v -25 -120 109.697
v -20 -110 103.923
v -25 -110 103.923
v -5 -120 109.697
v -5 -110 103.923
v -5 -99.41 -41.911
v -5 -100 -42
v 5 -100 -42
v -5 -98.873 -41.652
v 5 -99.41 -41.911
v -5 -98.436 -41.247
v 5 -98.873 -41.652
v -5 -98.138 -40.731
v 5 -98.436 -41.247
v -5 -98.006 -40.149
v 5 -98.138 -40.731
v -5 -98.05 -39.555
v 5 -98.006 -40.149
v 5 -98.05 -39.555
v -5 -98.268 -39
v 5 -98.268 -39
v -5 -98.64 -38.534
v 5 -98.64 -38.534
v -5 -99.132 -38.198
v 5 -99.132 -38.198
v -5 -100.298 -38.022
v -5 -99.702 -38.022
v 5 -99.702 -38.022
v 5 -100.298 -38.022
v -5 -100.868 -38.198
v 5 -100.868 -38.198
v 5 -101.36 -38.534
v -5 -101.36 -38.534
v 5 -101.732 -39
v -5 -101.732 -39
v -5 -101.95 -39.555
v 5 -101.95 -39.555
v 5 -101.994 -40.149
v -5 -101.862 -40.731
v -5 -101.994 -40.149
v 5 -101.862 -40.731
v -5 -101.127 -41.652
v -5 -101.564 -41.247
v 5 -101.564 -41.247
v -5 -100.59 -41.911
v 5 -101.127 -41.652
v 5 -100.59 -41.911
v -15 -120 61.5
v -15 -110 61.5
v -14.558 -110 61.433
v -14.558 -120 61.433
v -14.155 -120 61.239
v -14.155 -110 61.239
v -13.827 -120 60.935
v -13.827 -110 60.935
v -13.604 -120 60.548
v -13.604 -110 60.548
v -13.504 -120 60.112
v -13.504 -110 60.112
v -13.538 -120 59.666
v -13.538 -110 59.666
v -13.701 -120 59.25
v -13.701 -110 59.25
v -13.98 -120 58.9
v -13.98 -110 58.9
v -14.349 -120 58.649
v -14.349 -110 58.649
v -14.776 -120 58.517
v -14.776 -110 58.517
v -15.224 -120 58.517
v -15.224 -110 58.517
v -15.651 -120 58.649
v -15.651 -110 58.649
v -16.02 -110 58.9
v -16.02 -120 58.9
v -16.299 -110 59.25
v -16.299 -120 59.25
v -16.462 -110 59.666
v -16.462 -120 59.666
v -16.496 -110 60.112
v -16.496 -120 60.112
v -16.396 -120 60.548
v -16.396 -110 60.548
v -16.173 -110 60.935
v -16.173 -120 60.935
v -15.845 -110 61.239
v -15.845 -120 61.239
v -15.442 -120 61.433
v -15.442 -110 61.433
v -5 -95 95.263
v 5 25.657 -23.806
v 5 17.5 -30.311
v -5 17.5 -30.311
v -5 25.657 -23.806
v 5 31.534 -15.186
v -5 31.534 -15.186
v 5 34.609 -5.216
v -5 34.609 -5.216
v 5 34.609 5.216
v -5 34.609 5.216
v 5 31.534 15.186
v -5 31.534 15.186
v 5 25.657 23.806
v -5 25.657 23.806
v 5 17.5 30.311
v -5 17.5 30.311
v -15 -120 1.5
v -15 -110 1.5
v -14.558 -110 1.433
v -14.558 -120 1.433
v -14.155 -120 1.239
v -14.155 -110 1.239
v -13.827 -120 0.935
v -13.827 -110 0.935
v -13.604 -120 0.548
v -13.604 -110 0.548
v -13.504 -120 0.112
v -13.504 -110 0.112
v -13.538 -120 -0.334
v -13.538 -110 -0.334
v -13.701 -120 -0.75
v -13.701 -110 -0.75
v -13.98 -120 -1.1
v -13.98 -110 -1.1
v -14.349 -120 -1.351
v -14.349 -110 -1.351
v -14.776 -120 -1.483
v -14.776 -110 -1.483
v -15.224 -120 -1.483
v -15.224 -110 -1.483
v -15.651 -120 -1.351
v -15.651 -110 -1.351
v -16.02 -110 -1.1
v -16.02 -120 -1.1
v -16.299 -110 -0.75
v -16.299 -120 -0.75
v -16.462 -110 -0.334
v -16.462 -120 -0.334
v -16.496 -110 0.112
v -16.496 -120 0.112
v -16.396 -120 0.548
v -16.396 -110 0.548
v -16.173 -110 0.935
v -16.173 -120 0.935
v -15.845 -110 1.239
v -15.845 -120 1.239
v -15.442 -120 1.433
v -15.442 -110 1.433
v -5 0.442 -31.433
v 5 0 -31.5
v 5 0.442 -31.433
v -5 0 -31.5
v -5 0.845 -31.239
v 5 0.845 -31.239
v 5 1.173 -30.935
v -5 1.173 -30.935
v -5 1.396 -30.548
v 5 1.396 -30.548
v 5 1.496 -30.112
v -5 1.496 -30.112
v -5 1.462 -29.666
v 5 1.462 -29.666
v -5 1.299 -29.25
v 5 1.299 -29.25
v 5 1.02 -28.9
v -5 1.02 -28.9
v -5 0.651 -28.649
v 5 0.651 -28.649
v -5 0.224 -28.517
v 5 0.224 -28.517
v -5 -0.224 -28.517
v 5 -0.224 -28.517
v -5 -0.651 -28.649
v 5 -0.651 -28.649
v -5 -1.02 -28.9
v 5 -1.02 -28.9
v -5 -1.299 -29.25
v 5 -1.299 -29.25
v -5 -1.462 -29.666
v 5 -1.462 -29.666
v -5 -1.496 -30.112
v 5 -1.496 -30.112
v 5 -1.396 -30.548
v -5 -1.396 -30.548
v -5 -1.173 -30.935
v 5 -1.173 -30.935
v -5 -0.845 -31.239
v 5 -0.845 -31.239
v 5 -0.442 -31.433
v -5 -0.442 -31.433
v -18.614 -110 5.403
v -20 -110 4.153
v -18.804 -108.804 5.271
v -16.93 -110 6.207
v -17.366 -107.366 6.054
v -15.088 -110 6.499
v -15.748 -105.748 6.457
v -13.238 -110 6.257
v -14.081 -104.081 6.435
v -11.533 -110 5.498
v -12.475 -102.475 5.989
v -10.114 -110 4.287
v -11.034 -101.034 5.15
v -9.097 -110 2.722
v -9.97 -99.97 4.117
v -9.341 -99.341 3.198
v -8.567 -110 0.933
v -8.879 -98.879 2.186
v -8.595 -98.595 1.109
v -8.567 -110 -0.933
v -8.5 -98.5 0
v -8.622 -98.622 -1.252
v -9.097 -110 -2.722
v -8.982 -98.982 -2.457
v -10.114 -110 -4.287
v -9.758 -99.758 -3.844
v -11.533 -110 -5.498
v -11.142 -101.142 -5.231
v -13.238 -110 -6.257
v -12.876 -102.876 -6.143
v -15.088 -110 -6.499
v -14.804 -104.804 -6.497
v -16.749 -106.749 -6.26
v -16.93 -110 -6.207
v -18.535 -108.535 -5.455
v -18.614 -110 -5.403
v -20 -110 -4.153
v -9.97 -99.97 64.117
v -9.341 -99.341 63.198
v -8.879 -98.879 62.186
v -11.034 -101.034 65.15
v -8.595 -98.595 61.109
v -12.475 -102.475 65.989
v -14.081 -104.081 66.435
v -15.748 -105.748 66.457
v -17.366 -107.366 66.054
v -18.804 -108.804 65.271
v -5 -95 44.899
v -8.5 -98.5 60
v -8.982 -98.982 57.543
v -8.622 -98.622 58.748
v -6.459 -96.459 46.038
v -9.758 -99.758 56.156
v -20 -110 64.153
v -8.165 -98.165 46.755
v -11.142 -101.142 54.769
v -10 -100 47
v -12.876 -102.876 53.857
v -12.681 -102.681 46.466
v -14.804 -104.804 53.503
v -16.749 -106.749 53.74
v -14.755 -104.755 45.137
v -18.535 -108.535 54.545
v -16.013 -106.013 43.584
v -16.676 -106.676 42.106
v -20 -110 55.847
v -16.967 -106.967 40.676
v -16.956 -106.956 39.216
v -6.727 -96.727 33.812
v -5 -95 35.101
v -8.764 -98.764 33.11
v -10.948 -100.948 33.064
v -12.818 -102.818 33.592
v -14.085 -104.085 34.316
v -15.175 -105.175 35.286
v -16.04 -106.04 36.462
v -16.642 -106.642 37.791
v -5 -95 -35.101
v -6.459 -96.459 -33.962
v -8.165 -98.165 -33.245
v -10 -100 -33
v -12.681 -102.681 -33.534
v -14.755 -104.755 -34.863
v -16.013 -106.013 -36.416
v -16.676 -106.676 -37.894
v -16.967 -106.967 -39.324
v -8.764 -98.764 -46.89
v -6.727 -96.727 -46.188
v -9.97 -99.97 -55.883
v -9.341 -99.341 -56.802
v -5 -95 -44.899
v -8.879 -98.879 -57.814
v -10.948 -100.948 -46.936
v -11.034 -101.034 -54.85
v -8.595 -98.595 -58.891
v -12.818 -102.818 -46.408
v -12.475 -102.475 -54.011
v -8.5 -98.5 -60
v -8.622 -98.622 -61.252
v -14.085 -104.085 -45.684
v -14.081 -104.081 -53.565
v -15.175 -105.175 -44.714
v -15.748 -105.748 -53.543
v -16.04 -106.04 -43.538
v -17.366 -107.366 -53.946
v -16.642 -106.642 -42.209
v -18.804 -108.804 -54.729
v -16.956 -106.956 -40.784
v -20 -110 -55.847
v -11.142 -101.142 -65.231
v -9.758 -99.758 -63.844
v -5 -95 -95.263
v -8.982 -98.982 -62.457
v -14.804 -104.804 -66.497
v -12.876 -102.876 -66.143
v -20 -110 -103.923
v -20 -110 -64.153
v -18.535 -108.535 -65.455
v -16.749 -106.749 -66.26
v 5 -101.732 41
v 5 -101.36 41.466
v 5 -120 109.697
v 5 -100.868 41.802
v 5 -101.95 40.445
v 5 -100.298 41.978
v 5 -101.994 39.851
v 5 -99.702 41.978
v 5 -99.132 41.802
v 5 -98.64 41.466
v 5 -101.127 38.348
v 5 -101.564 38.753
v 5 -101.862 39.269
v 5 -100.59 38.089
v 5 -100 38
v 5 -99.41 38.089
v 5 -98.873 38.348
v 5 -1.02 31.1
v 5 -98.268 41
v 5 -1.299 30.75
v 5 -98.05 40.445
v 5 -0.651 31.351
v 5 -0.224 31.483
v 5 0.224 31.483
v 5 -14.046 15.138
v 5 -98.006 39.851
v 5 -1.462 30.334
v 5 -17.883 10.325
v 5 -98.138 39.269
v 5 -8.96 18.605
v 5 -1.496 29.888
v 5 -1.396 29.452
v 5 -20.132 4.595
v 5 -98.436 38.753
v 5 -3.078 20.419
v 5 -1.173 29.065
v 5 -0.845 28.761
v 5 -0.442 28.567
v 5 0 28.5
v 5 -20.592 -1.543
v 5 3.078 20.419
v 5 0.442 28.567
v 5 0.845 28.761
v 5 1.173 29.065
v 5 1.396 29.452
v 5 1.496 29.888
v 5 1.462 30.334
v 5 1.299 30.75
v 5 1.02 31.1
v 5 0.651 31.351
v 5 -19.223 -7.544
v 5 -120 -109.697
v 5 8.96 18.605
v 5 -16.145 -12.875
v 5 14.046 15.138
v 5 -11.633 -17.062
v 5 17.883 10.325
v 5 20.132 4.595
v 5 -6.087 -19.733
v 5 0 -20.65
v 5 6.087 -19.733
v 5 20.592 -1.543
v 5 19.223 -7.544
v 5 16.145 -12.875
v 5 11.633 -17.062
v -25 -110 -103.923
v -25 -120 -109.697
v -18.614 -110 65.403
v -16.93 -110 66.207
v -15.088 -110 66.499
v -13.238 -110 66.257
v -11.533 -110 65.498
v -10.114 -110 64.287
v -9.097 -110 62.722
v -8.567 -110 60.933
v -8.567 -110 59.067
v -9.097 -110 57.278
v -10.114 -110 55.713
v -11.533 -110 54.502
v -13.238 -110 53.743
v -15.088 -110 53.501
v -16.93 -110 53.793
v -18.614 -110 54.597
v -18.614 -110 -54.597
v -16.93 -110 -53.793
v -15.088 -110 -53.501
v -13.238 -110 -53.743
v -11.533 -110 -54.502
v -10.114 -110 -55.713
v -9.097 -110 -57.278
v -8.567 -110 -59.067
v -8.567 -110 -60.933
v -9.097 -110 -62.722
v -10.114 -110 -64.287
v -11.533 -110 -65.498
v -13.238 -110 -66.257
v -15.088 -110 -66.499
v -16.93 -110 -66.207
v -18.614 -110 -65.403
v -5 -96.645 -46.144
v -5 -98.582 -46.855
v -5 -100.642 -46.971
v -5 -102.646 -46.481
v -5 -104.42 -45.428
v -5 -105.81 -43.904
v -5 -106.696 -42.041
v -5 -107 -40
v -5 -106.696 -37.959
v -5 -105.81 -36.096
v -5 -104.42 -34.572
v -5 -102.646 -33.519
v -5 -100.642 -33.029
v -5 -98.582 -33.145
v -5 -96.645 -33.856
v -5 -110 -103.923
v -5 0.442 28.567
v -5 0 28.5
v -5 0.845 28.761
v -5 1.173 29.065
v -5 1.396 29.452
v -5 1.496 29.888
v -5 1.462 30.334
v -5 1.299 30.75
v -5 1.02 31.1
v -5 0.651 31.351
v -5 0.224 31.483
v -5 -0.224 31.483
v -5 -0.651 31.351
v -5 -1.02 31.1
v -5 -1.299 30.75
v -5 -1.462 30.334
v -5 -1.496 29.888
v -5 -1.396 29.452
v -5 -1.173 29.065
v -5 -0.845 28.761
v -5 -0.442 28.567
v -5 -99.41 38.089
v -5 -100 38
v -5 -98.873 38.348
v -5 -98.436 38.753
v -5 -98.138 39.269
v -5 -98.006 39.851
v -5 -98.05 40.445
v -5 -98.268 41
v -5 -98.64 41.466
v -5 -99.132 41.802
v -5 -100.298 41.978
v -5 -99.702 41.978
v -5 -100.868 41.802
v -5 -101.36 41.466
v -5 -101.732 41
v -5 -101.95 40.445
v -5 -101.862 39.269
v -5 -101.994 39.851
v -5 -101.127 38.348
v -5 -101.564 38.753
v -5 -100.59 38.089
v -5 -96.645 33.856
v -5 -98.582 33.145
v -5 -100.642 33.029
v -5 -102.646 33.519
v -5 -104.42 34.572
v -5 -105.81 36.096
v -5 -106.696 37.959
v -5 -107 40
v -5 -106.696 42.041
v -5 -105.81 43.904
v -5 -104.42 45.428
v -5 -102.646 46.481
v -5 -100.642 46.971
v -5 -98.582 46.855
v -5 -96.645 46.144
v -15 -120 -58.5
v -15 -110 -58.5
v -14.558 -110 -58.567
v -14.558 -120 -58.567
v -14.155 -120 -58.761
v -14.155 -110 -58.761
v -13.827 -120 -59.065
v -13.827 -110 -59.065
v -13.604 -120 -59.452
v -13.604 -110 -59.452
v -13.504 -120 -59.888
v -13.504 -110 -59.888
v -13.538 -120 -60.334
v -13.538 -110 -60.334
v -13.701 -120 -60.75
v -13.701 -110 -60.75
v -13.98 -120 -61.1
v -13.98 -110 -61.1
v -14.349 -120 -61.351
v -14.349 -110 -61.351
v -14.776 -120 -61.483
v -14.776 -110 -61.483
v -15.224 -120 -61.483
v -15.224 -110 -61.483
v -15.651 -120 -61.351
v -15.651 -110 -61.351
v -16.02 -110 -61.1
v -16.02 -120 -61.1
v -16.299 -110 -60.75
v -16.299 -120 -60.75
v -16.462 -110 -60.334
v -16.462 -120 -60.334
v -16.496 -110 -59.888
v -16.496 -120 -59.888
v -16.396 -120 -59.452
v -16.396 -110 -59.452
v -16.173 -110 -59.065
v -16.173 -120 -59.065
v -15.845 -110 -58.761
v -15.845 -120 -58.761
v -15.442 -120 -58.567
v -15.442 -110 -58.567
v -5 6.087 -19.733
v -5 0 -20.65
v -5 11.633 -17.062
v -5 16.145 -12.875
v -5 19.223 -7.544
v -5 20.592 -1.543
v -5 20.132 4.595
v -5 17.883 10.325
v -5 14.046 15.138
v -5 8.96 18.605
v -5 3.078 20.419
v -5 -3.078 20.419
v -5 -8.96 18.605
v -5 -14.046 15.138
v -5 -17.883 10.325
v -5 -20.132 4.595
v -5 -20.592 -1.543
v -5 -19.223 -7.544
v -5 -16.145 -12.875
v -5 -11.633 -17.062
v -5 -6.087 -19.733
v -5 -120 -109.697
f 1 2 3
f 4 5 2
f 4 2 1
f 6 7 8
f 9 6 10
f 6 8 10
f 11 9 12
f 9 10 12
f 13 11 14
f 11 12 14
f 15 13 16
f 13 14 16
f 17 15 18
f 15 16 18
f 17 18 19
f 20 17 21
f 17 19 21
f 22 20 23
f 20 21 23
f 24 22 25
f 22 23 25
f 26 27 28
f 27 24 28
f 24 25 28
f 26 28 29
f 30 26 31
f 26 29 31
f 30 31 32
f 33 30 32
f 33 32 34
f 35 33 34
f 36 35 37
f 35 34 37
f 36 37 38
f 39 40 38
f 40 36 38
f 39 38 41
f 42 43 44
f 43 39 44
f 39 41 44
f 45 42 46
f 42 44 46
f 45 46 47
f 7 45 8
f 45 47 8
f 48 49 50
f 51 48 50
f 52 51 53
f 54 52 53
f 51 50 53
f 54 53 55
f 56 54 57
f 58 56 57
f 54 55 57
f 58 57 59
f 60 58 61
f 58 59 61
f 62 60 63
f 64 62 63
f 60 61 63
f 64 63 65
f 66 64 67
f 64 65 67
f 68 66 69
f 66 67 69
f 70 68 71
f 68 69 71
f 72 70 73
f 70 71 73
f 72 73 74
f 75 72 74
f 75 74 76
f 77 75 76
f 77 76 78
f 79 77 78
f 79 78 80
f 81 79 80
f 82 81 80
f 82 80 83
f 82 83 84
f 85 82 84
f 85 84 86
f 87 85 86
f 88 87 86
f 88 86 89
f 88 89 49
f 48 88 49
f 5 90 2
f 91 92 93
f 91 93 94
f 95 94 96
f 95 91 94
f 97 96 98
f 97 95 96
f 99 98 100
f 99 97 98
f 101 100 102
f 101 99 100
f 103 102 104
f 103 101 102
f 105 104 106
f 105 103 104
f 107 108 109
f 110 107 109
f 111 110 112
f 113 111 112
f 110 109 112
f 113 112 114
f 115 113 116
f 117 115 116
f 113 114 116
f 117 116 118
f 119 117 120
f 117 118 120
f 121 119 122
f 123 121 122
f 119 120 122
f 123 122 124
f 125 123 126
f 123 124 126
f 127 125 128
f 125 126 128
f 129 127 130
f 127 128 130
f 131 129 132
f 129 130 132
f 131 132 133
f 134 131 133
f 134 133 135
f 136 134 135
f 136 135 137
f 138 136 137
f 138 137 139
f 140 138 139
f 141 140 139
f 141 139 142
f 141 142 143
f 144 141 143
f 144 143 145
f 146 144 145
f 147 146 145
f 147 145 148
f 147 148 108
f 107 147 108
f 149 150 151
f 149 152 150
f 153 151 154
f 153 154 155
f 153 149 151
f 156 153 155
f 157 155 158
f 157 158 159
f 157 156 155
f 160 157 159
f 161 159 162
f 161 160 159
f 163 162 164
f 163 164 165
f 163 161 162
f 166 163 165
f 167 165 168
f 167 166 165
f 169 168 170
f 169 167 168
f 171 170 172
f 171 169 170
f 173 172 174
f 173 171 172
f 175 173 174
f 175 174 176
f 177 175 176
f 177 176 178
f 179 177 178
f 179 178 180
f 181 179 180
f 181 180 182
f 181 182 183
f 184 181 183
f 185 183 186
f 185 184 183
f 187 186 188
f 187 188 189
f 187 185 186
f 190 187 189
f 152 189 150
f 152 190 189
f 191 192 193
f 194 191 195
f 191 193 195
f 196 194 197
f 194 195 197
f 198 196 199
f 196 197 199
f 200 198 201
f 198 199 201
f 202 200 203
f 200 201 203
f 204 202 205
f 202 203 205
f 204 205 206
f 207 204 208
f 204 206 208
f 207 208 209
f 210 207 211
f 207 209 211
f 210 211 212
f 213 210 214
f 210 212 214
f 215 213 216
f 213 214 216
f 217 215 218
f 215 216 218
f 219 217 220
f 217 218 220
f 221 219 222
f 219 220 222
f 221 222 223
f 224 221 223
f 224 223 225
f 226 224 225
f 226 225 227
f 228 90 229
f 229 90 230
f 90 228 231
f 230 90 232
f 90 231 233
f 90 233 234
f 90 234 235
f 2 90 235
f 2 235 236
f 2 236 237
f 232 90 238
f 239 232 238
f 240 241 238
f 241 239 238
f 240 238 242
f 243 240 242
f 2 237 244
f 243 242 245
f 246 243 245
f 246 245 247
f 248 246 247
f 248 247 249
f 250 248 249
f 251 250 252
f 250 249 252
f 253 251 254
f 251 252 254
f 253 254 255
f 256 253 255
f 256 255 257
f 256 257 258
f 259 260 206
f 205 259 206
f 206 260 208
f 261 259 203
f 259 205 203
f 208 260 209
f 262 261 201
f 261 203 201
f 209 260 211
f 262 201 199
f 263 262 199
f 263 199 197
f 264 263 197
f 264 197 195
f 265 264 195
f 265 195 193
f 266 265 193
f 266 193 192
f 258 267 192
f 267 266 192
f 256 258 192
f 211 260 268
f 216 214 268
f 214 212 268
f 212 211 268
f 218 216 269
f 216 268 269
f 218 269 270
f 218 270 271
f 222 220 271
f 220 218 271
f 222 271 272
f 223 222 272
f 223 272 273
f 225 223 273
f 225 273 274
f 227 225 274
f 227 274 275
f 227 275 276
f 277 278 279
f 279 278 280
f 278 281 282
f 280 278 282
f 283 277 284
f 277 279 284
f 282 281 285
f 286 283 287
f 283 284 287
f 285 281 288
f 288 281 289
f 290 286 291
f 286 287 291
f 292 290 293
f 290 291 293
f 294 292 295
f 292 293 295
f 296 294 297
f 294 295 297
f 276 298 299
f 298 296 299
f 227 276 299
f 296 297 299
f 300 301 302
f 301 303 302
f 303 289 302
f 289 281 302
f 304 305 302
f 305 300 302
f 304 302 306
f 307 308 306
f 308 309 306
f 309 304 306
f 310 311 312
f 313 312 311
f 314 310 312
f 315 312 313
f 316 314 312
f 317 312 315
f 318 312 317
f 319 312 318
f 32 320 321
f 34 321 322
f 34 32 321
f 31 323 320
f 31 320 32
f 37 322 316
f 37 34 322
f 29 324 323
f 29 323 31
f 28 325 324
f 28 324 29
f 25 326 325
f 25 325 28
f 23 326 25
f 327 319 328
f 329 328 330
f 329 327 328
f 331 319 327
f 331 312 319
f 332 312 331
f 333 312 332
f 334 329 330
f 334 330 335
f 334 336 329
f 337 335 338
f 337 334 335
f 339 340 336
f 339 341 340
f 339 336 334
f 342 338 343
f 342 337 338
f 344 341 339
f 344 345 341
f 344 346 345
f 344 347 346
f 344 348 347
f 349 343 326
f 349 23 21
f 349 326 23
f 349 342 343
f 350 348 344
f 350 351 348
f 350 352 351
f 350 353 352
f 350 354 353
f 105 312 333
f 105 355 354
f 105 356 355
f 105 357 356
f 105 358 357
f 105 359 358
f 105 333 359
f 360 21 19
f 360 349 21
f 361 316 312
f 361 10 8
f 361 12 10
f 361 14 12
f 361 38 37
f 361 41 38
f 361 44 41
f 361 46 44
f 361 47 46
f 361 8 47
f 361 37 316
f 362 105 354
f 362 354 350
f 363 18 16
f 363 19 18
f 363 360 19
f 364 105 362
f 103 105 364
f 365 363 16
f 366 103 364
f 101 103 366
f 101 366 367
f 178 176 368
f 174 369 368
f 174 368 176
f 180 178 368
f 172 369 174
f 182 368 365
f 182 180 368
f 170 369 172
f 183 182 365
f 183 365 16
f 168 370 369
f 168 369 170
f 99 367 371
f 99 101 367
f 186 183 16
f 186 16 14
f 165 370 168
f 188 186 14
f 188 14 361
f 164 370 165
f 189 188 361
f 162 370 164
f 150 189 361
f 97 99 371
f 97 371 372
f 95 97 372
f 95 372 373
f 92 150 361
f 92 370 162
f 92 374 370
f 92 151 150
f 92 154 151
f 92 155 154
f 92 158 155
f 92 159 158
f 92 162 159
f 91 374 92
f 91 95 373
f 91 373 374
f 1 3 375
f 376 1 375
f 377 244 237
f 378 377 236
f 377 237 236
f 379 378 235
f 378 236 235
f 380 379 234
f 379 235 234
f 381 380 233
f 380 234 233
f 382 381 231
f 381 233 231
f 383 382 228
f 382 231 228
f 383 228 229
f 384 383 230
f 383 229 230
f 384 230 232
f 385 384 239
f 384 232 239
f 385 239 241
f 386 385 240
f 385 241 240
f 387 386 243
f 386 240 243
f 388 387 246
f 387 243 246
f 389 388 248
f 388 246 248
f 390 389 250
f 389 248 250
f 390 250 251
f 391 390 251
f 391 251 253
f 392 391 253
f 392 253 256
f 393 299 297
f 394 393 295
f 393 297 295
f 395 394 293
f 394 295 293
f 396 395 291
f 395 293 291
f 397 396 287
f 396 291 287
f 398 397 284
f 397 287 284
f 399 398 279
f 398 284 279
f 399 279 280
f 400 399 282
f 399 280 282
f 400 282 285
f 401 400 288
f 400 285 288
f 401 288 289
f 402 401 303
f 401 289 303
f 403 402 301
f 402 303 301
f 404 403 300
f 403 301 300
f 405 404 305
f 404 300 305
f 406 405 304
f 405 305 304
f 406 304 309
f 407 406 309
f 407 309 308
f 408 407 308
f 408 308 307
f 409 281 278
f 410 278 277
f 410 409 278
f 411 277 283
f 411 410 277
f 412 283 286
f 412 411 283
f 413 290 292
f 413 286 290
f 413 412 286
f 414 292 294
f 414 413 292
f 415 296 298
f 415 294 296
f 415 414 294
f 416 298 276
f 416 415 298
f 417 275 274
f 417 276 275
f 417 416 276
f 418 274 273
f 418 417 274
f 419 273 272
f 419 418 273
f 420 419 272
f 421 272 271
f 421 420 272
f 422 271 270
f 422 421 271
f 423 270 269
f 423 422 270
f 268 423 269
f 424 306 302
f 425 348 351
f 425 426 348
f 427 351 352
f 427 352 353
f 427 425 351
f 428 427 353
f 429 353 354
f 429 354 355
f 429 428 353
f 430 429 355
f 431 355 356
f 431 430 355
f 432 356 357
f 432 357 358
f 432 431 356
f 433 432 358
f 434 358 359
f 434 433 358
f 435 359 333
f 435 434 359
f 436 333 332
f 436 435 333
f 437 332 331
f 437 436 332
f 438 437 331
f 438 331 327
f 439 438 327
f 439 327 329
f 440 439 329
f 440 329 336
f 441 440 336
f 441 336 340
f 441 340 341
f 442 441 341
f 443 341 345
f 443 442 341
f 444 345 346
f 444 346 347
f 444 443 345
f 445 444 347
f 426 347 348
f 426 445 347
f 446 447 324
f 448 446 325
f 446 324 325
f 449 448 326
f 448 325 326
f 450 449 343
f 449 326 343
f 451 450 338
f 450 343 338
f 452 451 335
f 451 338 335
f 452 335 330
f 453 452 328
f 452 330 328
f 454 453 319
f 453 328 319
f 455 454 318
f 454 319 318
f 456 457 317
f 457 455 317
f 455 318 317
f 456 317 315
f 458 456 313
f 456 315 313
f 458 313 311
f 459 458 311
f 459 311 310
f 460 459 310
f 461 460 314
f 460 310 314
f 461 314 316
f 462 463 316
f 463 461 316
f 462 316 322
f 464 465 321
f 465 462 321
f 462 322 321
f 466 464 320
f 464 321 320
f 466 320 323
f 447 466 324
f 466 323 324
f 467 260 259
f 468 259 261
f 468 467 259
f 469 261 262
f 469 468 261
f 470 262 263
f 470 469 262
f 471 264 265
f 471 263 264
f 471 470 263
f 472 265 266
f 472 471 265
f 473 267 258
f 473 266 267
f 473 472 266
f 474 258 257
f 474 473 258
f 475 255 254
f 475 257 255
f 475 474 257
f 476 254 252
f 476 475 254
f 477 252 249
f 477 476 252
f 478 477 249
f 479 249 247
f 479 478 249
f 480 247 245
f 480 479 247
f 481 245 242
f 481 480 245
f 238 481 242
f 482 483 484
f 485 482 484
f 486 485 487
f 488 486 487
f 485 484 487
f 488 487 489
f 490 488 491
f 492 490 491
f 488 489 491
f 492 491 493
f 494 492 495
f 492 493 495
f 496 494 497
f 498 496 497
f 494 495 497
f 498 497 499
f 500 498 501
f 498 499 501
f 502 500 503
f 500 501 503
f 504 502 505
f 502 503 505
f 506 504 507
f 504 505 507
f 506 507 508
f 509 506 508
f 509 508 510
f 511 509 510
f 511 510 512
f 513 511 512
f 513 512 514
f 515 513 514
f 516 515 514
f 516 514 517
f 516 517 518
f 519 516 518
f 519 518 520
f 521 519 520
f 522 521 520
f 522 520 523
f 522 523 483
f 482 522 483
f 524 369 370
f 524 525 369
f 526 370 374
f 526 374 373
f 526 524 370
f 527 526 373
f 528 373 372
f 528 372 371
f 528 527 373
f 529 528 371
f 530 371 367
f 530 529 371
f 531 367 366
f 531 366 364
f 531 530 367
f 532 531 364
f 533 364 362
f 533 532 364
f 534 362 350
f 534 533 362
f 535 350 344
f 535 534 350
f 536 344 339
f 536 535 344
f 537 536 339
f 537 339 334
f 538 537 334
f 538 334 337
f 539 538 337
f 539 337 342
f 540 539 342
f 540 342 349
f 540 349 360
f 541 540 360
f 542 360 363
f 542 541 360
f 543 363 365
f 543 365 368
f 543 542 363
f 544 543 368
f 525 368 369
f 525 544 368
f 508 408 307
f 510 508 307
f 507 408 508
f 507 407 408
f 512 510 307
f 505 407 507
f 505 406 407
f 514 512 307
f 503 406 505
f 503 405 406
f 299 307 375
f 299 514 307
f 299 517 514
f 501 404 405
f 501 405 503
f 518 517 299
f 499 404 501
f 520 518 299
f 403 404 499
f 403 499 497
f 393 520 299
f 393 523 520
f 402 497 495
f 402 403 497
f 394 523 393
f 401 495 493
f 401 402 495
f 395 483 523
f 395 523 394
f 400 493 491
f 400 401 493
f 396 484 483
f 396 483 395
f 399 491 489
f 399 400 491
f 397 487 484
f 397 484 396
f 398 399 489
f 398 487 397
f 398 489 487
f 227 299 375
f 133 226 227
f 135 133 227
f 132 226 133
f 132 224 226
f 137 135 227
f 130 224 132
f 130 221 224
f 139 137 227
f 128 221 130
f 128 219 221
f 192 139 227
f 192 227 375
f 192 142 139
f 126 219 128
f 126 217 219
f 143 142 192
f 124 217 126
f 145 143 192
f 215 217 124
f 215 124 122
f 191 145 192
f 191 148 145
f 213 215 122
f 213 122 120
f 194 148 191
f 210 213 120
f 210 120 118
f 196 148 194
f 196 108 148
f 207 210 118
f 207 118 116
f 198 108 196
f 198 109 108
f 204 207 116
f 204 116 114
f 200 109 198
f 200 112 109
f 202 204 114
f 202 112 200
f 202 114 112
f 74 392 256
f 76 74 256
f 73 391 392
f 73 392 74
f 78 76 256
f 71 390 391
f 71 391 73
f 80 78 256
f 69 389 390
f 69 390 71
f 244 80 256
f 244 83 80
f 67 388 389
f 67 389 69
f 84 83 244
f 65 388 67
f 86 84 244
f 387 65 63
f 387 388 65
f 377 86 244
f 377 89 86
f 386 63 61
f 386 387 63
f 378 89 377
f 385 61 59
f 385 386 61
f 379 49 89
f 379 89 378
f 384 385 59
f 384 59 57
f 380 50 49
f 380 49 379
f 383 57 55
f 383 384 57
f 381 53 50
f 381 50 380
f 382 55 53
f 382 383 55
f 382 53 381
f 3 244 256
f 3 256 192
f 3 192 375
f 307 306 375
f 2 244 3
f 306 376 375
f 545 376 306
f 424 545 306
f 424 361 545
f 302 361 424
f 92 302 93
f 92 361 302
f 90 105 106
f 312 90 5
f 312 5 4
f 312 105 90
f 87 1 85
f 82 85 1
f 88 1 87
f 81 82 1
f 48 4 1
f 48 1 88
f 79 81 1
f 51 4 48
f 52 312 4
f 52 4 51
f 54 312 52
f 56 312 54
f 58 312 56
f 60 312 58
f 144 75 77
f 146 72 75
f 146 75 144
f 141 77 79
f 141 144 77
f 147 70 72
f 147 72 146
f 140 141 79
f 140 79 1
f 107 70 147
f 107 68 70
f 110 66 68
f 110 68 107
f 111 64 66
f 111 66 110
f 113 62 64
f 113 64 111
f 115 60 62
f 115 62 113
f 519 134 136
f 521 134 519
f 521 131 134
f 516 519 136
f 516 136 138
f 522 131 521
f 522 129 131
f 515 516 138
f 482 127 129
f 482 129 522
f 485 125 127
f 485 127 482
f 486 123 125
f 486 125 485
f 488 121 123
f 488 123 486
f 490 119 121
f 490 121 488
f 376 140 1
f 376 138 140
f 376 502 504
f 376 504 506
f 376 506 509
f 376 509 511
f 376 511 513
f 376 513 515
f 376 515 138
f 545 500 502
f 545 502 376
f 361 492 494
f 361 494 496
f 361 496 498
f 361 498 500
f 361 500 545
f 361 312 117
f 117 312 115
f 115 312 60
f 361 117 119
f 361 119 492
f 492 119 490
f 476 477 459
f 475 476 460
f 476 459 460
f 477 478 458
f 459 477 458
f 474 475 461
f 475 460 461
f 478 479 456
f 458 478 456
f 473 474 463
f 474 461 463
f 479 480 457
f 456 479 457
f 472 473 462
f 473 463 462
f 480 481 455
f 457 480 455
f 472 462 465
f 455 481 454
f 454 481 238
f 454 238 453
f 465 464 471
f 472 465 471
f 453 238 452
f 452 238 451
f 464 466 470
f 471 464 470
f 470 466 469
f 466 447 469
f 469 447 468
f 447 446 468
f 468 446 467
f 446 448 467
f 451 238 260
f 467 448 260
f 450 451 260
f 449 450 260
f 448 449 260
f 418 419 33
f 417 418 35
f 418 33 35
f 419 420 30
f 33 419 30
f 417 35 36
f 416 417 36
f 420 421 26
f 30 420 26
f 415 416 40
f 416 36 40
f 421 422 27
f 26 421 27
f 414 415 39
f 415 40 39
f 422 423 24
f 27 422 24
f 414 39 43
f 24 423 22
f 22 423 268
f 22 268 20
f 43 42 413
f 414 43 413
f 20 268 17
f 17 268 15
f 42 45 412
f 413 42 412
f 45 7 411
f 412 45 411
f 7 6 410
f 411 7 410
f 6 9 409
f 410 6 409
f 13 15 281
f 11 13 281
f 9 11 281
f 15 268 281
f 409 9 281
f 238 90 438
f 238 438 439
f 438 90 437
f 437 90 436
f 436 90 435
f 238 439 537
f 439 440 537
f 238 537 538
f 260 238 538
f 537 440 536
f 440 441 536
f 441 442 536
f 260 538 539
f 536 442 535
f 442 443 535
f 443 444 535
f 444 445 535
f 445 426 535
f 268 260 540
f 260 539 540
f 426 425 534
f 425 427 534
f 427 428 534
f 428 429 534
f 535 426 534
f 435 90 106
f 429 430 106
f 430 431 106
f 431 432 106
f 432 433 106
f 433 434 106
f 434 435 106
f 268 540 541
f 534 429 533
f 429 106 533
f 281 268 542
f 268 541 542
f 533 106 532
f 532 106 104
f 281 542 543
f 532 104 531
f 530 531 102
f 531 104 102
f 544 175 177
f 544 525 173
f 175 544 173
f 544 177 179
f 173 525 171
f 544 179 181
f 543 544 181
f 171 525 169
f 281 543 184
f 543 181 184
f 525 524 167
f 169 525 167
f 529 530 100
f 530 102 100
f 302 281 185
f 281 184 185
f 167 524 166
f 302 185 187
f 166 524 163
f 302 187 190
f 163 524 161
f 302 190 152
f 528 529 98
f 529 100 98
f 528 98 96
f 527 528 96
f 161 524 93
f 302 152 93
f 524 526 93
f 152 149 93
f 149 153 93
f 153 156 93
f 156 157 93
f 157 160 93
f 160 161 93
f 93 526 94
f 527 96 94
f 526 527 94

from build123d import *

# Parameters (mm, degrees)
CROQUIS1_R              = 20.65
CROQUIS1_R_2            = 1.5
SALIENTE_EXTRUIR1_DEPTH = 5
SALIENTE_EXTRUIR2_DEPTH = 20
CROQUIS3_R              = 1.5
CORTAR_EXTRUIR1_DEPTH   = 20
CROQUIS4_R              = 2
CORTAR_EXTRUIR2_DEPTH   = 166.327956902
CHAFL_N1_SIZE           = 15
CROQUIS5_R              = 7
CROQUIS5_R_2            = 2
CORTAR_EXTRUIR3_DEPTH   = 30
CORTAR_EXTRUIR4_START   = 30
CROQUIS6_R              = 6.5
CROQUIS6_R_2            = 1.5
CORTAR_EXTRUIR4_DEPTH   = 30


with BuildPart() as part:
    # Croquis1 → Saliente-Extruir1 (new, symmetric)
    with BuildSketch(Plane(origin=(0, 0, 0), x_dir=(0, 0, -1), z_dir=(1, 0, 0))):
        with BuildLine():
            Line((-109.696551146, -120), (109.696551146, -120))
            Line((109.696551146, -120), (30.310889132, 17.5))
            ThreePointArc((30.310889132, 17.5), (0, 35), (-30.310889132, 17.5))
            Line((-30.310889132, 17.5), (-109.696551146, -120))
        make_face()
        Circle(CROQUIS1_R, mode=Mode.SUBTRACT)
        with Locations((-30, 0)):
            Circle(CROQUIS1_R_2, mode=Mode.SUBTRACT)
        with Locations((30, 0)):
            Circle(CROQUIS1_R_2, mode=Mode.SUBTRACT)
    extrude(amount=SALIENTE_EXTRUIR1_DEPTH, both=True)

    # Croquis2 → Saliente-Extruir2 (add)
    with BuildSketch(Plane.ZY.offset(5)):
        Polygon((-109.696551146, -120), (-103.923048454, -110), (103.923048454, -110), (109.696551146, -120), align=None)
    extrude(amount=SALIENTE_EXTRUIR2_DEPTH)

    # Croquis3 → Cortar-Extruir1 (cut)
    with BuildSketch(Plane(origin=(0, -110, 0), x_dir=(1, 0, 0), z_dir=(0, 1, 0))):
        with Locations(Location((-15, 60, 0), (0, 0, 270))):
            Circle(CROQUIS3_R)
        with Locations(Location((-15, -60, 0), (0, 0, 270))):
            Circle(CROQUIS3_R)
        with Locations(Location((-15, 0, 0), (0, 0, 270))):
            Circle(CROQUIS3_R)
    extrude(amount=-CORTAR_EXTRUIR1_DEPTH, mode=Mode.SUBTRACT)

    # Croquis4 → Cortar-Extruir2 (cut, through all)
    with BuildSketch(Plane(origin=(5, 0, 0), x_dir=(0, 0, -1), z_dir=(1, 0, 0))):
        with Locations((-40, -100)):
            Circle(CROQUIS4_R)
        with Locations((40, -100)):
            Circle(CROQUIS4_R)
    extrude(amount=-CORTAR_EXTRUIR2_DEPTH, mode=Mode.SUBTRACT)

    # Chaflán1
    # the kernel refuses this chamfer: 15 mm, written as the material it adds along each edge
    with BuildSketch(Plane(origin=(-5, -110, -142.498293274), x_dir=(0.02749587661058636, 0.9996219169112966, 0), z_dir=(0, 0, 1))) as chafl_n1_piece_1_section:
        Polygon((CHAFL_N1_SIZE * 0.999621916911, CHAFL_N1_SIZE * 0.0274958766106), (-CHAFL_N1_SIZE * 0.0274958766106, CHAFL_N1_SIZE * 0.999621916911), (0, 0), align=None)
    chafl_n1_piece_1 = extrude(amount=284.996586547, mode=Mode.PRIVATE)
    chafl_n1_piece_1 = split(chafl_n1_piece_1, bisect_by=Plane(origin=(-9.982063802, -61.362690363, 75.842284643), z_dir=(0, -0.500000000000004, -0.8660254037844364)), keep=Keep.TOP, mode=Mode.PRIVATE)
    chafl_n1_piece_1 = split(chafl_n1_piece_1, bisect_by=Plane(origin=(-9.982063802, -61.362690271, -75.84228459), z_dir=(0, -0.4999999999999981, 0.8660254037844397)), keep=Keep.TOP, mode=Mode.PRIVATE)
    chafl_n1_piece_1 = chafl_n1_piece_1 - Plane(origin=(-9.982063802, -100, 40), x_dir=(0, 0, -1), z_dir=(1, 0, 0)) * Cylinder(2, 630, mode=Mode.PRIVATE)
    chafl_n1_piece_1 = chafl_n1_piece_1 - Plane(origin=(-9.982063802, -100, -40), x_dir=(0, 0, -1), z_dir=(1, 0, 0)) * Cylinder(2, 630, mode=Mode.PRIVATE)
    chafl_n1_piece_1 = chafl_n1_piece_1 - Plane(origin=(-15, -105.150253756, -60), x_dir=(0, 0, 1), z_dir=(0, 1, 0)) * Cylinder(1.5, 630, mode=Mode.PRIVATE)
    chafl_n1_piece_1 = chafl_n1_piece_1 - Plane(origin=(-15, -105.150253756, 0), x_dir=(0, 0, 1), z_dir=(0, 1, 0)) * Cylinder(1.5, 630, mode=Mode.PRIVATE)
    chafl_n1_piece_1 = chafl_n1_piece_1 - Plane(origin=(-15, -105.150253756, 60), x_dir=(0, 0, 1), z_dir=(0, 1, 0)) * Cylinder(1.5, 630, mode=Mode.PRIVATE)
    add(chafl_n1_piece_1)

    # Croquis5 → Cortar-Extruir3 (cut)
    # profile 1 of 2: a face of its own
    with BuildSketch(Plane.ZY.offset(5)):
        with Locations((-40, -100)):
            Circle(CROQUIS5_R)
        with Locations(Location((-40, -100, 0), (0, 0, 180))):
            Circle(CROQUIS5_R_2, mode=Mode.SUBTRACT)
    # profile 2 of 2: a face of its own
    with BuildSketch(Plane.ZY.offset(5)):
        with Locations((40, -100)):
            Circle(CROQUIS5_R)
        with Locations(Location((40, -100, 0), (0, 0, 180))):
            Circle(CROQUIS5_R_2, mode=Mode.SUBTRACT)
    extrude(amount=CORTAR_EXTRUIR3_DEPTH, mode=Mode.SUBTRACT)

    # Croquis6 → Cortar-Extruir4 (cut)
    # profile 1 of 3: a face of its own
    with BuildSketch(Plane(origin=(0, -110, 0), x_dir=(1, 0, 0), z_dir=(0, 1, 0)).offset(CORTAR_EXTRUIR4_START)):
        with Locations((-15, 60)):
            Circle(CROQUIS6_R)
        with Locations(Location((-15, 60, 0), (0, 0, 270))):
            Circle(CROQUIS6_R_2, mode=Mode.SUBTRACT)
    # profile 2 of 3: a face of its own
    with BuildSketch(Plane(origin=(0, -110, 0), x_dir=(1, 0, 0), z_dir=(0, 1, 0)).offset(CORTAR_EXTRUIR4_START)):
        with Locations((-15, 0)):
            Circle(CROQUIS6_R)
        with Locations(Location((-15, 0, 0), (0, 0, 270))):
            Circle(CROQUIS6_R_2, mode=Mode.SUBTRACT)
    # profile 3 of 3: a face of its own
    with BuildSketch(Plane(origin=(0, -110, 0), x_dir=(1, 0, 0), z_dir=(0, 1, 0)).offset(CORTAR_EXTRUIR4_START)):
        with Locations((-15, -60)):
            Circle(CROQUIS6_R)
        with Locations(Location((-15, -60, 0), (0, 0, 270))):
            Circle(CROQUIS6_R_2, mode=Mode.SUBTRACT)
    extrude(amount=-CORTAR_EXTRUIR4_DEPTH, mode=Mode.SUBTRACT)


solid = part.part
